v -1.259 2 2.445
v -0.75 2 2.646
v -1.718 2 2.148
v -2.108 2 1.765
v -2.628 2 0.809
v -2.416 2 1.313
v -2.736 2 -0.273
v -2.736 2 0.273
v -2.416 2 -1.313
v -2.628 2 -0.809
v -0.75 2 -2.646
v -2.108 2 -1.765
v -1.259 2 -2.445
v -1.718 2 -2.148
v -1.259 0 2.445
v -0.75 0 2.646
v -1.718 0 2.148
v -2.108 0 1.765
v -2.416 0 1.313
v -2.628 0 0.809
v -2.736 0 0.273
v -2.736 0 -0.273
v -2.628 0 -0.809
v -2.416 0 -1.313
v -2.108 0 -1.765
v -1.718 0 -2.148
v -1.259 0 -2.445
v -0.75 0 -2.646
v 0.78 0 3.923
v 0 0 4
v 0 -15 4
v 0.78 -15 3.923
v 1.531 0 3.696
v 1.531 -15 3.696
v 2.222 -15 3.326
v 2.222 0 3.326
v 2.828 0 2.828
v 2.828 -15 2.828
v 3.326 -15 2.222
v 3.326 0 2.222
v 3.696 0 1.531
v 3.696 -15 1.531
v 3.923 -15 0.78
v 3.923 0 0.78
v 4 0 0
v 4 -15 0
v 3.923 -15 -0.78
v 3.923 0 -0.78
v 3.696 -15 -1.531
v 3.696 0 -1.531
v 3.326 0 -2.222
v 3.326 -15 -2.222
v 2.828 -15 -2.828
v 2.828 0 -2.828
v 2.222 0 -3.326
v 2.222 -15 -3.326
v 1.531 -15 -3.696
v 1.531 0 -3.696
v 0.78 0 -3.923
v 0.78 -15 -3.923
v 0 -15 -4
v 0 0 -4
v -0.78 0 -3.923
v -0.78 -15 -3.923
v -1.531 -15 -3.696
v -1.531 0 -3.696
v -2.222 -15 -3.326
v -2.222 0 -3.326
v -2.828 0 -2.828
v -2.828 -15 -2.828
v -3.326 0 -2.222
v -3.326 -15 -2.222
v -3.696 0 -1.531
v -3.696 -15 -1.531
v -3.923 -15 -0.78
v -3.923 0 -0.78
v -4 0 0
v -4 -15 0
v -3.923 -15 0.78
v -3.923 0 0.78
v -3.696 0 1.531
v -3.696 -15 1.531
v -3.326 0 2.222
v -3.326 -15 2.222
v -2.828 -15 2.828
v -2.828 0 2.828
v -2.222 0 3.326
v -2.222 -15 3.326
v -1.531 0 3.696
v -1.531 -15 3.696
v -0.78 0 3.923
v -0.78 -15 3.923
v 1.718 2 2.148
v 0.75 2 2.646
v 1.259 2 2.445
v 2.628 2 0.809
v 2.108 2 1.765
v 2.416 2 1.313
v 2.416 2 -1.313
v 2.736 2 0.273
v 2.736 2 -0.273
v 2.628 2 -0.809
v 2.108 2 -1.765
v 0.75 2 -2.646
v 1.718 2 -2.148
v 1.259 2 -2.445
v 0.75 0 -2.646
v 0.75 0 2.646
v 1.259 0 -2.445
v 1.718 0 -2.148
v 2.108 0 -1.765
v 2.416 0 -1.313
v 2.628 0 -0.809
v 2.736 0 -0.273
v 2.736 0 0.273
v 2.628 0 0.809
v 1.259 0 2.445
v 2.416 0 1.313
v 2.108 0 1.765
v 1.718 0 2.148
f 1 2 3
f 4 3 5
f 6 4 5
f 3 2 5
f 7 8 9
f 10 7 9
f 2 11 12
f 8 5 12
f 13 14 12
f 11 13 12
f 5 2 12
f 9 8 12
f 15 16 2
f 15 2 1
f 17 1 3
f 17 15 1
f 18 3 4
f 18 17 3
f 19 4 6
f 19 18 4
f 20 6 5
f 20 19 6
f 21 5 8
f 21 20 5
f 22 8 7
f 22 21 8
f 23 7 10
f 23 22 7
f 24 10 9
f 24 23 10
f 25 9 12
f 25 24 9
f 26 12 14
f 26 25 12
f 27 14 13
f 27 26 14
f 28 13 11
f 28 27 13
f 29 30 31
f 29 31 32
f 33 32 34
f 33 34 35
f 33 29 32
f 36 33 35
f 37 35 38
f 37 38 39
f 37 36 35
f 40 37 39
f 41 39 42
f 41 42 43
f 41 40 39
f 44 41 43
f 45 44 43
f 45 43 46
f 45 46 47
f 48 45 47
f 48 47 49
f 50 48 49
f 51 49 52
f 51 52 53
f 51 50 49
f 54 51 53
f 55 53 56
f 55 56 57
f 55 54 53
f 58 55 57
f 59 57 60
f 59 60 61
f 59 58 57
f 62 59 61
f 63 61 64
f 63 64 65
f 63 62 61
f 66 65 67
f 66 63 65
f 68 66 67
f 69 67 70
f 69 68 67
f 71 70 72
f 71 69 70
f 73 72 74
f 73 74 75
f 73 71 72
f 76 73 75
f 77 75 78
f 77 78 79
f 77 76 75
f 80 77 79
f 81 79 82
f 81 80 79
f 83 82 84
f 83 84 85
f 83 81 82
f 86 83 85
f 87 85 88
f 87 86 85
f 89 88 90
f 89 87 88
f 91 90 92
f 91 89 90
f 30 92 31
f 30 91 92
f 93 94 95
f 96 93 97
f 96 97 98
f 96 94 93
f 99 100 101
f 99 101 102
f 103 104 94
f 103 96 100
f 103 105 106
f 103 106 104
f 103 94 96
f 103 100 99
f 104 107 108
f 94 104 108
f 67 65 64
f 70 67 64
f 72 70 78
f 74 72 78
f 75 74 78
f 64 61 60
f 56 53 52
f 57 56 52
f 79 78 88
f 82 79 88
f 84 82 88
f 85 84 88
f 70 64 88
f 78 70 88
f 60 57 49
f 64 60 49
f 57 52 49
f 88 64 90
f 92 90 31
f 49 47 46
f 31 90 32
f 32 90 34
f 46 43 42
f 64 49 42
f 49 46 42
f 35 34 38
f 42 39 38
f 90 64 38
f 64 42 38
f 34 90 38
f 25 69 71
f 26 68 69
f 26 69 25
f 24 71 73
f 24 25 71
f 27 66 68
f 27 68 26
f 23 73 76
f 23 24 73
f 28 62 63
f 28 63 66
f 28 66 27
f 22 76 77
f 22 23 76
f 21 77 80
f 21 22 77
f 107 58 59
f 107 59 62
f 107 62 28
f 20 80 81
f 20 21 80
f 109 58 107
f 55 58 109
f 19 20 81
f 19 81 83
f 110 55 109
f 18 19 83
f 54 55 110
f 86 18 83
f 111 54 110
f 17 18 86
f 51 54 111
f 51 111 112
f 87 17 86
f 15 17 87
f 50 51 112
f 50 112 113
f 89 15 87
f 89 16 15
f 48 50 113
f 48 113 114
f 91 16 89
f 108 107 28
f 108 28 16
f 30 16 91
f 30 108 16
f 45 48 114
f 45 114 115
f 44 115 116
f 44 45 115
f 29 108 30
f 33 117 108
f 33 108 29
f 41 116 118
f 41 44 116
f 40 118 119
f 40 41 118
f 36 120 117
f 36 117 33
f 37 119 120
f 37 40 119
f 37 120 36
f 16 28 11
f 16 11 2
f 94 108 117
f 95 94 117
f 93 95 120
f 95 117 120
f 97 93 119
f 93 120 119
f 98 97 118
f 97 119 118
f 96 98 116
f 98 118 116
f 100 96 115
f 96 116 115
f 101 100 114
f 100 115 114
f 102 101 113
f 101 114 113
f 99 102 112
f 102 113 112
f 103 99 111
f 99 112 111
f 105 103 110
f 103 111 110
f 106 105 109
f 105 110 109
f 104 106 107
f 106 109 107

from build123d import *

# Parameters (mm, degrees)
SKETCH2_R           = 4
BOSS_EXTRUDE1_DEPTH = 15
BOSS_EXTRUDE2_DEPTH = 2


with BuildPart() as part:
    # Sketch2 → Boss-Extrude1 (new body)
    with BuildSketch(Plane(origin=(0, 0, 0), x_dir=(1, 0, 0), z_dir=(0, 1, 0))):
        with Locations(Location((0, 0, 0), (0, 0, 270))):
            Circle(SKETCH2_R)
    extrude(amount=-BOSS_EXTRUDE1_DEPTH)

    # Sketch3 → Boss-Extrude2 (add)
    with BuildSketch(Plane(origin=(0, 0, 0), x_dir=(1, 0, 0), z_dir=(0, 1, 0))):
        with BuildLine():
            Line((-0.75, 2.645751311), (-0.75, -2.645751311))
            ThreePointArc((-0.75, -2.645751311), (-2.75, 0), (-0.75, 2.645751311))
        make_face()
        with BuildLine():
            Line((0.75, 2.645751311), (0.75, -2.645751311))
            ThreePointArc((0.75, -2.645751311), (2.75, 0), (0.75, 2.645751311))
        make_face()
    extrude(amount=BOSS_EXTRUDE2_DEPTH)


solid = part.part
